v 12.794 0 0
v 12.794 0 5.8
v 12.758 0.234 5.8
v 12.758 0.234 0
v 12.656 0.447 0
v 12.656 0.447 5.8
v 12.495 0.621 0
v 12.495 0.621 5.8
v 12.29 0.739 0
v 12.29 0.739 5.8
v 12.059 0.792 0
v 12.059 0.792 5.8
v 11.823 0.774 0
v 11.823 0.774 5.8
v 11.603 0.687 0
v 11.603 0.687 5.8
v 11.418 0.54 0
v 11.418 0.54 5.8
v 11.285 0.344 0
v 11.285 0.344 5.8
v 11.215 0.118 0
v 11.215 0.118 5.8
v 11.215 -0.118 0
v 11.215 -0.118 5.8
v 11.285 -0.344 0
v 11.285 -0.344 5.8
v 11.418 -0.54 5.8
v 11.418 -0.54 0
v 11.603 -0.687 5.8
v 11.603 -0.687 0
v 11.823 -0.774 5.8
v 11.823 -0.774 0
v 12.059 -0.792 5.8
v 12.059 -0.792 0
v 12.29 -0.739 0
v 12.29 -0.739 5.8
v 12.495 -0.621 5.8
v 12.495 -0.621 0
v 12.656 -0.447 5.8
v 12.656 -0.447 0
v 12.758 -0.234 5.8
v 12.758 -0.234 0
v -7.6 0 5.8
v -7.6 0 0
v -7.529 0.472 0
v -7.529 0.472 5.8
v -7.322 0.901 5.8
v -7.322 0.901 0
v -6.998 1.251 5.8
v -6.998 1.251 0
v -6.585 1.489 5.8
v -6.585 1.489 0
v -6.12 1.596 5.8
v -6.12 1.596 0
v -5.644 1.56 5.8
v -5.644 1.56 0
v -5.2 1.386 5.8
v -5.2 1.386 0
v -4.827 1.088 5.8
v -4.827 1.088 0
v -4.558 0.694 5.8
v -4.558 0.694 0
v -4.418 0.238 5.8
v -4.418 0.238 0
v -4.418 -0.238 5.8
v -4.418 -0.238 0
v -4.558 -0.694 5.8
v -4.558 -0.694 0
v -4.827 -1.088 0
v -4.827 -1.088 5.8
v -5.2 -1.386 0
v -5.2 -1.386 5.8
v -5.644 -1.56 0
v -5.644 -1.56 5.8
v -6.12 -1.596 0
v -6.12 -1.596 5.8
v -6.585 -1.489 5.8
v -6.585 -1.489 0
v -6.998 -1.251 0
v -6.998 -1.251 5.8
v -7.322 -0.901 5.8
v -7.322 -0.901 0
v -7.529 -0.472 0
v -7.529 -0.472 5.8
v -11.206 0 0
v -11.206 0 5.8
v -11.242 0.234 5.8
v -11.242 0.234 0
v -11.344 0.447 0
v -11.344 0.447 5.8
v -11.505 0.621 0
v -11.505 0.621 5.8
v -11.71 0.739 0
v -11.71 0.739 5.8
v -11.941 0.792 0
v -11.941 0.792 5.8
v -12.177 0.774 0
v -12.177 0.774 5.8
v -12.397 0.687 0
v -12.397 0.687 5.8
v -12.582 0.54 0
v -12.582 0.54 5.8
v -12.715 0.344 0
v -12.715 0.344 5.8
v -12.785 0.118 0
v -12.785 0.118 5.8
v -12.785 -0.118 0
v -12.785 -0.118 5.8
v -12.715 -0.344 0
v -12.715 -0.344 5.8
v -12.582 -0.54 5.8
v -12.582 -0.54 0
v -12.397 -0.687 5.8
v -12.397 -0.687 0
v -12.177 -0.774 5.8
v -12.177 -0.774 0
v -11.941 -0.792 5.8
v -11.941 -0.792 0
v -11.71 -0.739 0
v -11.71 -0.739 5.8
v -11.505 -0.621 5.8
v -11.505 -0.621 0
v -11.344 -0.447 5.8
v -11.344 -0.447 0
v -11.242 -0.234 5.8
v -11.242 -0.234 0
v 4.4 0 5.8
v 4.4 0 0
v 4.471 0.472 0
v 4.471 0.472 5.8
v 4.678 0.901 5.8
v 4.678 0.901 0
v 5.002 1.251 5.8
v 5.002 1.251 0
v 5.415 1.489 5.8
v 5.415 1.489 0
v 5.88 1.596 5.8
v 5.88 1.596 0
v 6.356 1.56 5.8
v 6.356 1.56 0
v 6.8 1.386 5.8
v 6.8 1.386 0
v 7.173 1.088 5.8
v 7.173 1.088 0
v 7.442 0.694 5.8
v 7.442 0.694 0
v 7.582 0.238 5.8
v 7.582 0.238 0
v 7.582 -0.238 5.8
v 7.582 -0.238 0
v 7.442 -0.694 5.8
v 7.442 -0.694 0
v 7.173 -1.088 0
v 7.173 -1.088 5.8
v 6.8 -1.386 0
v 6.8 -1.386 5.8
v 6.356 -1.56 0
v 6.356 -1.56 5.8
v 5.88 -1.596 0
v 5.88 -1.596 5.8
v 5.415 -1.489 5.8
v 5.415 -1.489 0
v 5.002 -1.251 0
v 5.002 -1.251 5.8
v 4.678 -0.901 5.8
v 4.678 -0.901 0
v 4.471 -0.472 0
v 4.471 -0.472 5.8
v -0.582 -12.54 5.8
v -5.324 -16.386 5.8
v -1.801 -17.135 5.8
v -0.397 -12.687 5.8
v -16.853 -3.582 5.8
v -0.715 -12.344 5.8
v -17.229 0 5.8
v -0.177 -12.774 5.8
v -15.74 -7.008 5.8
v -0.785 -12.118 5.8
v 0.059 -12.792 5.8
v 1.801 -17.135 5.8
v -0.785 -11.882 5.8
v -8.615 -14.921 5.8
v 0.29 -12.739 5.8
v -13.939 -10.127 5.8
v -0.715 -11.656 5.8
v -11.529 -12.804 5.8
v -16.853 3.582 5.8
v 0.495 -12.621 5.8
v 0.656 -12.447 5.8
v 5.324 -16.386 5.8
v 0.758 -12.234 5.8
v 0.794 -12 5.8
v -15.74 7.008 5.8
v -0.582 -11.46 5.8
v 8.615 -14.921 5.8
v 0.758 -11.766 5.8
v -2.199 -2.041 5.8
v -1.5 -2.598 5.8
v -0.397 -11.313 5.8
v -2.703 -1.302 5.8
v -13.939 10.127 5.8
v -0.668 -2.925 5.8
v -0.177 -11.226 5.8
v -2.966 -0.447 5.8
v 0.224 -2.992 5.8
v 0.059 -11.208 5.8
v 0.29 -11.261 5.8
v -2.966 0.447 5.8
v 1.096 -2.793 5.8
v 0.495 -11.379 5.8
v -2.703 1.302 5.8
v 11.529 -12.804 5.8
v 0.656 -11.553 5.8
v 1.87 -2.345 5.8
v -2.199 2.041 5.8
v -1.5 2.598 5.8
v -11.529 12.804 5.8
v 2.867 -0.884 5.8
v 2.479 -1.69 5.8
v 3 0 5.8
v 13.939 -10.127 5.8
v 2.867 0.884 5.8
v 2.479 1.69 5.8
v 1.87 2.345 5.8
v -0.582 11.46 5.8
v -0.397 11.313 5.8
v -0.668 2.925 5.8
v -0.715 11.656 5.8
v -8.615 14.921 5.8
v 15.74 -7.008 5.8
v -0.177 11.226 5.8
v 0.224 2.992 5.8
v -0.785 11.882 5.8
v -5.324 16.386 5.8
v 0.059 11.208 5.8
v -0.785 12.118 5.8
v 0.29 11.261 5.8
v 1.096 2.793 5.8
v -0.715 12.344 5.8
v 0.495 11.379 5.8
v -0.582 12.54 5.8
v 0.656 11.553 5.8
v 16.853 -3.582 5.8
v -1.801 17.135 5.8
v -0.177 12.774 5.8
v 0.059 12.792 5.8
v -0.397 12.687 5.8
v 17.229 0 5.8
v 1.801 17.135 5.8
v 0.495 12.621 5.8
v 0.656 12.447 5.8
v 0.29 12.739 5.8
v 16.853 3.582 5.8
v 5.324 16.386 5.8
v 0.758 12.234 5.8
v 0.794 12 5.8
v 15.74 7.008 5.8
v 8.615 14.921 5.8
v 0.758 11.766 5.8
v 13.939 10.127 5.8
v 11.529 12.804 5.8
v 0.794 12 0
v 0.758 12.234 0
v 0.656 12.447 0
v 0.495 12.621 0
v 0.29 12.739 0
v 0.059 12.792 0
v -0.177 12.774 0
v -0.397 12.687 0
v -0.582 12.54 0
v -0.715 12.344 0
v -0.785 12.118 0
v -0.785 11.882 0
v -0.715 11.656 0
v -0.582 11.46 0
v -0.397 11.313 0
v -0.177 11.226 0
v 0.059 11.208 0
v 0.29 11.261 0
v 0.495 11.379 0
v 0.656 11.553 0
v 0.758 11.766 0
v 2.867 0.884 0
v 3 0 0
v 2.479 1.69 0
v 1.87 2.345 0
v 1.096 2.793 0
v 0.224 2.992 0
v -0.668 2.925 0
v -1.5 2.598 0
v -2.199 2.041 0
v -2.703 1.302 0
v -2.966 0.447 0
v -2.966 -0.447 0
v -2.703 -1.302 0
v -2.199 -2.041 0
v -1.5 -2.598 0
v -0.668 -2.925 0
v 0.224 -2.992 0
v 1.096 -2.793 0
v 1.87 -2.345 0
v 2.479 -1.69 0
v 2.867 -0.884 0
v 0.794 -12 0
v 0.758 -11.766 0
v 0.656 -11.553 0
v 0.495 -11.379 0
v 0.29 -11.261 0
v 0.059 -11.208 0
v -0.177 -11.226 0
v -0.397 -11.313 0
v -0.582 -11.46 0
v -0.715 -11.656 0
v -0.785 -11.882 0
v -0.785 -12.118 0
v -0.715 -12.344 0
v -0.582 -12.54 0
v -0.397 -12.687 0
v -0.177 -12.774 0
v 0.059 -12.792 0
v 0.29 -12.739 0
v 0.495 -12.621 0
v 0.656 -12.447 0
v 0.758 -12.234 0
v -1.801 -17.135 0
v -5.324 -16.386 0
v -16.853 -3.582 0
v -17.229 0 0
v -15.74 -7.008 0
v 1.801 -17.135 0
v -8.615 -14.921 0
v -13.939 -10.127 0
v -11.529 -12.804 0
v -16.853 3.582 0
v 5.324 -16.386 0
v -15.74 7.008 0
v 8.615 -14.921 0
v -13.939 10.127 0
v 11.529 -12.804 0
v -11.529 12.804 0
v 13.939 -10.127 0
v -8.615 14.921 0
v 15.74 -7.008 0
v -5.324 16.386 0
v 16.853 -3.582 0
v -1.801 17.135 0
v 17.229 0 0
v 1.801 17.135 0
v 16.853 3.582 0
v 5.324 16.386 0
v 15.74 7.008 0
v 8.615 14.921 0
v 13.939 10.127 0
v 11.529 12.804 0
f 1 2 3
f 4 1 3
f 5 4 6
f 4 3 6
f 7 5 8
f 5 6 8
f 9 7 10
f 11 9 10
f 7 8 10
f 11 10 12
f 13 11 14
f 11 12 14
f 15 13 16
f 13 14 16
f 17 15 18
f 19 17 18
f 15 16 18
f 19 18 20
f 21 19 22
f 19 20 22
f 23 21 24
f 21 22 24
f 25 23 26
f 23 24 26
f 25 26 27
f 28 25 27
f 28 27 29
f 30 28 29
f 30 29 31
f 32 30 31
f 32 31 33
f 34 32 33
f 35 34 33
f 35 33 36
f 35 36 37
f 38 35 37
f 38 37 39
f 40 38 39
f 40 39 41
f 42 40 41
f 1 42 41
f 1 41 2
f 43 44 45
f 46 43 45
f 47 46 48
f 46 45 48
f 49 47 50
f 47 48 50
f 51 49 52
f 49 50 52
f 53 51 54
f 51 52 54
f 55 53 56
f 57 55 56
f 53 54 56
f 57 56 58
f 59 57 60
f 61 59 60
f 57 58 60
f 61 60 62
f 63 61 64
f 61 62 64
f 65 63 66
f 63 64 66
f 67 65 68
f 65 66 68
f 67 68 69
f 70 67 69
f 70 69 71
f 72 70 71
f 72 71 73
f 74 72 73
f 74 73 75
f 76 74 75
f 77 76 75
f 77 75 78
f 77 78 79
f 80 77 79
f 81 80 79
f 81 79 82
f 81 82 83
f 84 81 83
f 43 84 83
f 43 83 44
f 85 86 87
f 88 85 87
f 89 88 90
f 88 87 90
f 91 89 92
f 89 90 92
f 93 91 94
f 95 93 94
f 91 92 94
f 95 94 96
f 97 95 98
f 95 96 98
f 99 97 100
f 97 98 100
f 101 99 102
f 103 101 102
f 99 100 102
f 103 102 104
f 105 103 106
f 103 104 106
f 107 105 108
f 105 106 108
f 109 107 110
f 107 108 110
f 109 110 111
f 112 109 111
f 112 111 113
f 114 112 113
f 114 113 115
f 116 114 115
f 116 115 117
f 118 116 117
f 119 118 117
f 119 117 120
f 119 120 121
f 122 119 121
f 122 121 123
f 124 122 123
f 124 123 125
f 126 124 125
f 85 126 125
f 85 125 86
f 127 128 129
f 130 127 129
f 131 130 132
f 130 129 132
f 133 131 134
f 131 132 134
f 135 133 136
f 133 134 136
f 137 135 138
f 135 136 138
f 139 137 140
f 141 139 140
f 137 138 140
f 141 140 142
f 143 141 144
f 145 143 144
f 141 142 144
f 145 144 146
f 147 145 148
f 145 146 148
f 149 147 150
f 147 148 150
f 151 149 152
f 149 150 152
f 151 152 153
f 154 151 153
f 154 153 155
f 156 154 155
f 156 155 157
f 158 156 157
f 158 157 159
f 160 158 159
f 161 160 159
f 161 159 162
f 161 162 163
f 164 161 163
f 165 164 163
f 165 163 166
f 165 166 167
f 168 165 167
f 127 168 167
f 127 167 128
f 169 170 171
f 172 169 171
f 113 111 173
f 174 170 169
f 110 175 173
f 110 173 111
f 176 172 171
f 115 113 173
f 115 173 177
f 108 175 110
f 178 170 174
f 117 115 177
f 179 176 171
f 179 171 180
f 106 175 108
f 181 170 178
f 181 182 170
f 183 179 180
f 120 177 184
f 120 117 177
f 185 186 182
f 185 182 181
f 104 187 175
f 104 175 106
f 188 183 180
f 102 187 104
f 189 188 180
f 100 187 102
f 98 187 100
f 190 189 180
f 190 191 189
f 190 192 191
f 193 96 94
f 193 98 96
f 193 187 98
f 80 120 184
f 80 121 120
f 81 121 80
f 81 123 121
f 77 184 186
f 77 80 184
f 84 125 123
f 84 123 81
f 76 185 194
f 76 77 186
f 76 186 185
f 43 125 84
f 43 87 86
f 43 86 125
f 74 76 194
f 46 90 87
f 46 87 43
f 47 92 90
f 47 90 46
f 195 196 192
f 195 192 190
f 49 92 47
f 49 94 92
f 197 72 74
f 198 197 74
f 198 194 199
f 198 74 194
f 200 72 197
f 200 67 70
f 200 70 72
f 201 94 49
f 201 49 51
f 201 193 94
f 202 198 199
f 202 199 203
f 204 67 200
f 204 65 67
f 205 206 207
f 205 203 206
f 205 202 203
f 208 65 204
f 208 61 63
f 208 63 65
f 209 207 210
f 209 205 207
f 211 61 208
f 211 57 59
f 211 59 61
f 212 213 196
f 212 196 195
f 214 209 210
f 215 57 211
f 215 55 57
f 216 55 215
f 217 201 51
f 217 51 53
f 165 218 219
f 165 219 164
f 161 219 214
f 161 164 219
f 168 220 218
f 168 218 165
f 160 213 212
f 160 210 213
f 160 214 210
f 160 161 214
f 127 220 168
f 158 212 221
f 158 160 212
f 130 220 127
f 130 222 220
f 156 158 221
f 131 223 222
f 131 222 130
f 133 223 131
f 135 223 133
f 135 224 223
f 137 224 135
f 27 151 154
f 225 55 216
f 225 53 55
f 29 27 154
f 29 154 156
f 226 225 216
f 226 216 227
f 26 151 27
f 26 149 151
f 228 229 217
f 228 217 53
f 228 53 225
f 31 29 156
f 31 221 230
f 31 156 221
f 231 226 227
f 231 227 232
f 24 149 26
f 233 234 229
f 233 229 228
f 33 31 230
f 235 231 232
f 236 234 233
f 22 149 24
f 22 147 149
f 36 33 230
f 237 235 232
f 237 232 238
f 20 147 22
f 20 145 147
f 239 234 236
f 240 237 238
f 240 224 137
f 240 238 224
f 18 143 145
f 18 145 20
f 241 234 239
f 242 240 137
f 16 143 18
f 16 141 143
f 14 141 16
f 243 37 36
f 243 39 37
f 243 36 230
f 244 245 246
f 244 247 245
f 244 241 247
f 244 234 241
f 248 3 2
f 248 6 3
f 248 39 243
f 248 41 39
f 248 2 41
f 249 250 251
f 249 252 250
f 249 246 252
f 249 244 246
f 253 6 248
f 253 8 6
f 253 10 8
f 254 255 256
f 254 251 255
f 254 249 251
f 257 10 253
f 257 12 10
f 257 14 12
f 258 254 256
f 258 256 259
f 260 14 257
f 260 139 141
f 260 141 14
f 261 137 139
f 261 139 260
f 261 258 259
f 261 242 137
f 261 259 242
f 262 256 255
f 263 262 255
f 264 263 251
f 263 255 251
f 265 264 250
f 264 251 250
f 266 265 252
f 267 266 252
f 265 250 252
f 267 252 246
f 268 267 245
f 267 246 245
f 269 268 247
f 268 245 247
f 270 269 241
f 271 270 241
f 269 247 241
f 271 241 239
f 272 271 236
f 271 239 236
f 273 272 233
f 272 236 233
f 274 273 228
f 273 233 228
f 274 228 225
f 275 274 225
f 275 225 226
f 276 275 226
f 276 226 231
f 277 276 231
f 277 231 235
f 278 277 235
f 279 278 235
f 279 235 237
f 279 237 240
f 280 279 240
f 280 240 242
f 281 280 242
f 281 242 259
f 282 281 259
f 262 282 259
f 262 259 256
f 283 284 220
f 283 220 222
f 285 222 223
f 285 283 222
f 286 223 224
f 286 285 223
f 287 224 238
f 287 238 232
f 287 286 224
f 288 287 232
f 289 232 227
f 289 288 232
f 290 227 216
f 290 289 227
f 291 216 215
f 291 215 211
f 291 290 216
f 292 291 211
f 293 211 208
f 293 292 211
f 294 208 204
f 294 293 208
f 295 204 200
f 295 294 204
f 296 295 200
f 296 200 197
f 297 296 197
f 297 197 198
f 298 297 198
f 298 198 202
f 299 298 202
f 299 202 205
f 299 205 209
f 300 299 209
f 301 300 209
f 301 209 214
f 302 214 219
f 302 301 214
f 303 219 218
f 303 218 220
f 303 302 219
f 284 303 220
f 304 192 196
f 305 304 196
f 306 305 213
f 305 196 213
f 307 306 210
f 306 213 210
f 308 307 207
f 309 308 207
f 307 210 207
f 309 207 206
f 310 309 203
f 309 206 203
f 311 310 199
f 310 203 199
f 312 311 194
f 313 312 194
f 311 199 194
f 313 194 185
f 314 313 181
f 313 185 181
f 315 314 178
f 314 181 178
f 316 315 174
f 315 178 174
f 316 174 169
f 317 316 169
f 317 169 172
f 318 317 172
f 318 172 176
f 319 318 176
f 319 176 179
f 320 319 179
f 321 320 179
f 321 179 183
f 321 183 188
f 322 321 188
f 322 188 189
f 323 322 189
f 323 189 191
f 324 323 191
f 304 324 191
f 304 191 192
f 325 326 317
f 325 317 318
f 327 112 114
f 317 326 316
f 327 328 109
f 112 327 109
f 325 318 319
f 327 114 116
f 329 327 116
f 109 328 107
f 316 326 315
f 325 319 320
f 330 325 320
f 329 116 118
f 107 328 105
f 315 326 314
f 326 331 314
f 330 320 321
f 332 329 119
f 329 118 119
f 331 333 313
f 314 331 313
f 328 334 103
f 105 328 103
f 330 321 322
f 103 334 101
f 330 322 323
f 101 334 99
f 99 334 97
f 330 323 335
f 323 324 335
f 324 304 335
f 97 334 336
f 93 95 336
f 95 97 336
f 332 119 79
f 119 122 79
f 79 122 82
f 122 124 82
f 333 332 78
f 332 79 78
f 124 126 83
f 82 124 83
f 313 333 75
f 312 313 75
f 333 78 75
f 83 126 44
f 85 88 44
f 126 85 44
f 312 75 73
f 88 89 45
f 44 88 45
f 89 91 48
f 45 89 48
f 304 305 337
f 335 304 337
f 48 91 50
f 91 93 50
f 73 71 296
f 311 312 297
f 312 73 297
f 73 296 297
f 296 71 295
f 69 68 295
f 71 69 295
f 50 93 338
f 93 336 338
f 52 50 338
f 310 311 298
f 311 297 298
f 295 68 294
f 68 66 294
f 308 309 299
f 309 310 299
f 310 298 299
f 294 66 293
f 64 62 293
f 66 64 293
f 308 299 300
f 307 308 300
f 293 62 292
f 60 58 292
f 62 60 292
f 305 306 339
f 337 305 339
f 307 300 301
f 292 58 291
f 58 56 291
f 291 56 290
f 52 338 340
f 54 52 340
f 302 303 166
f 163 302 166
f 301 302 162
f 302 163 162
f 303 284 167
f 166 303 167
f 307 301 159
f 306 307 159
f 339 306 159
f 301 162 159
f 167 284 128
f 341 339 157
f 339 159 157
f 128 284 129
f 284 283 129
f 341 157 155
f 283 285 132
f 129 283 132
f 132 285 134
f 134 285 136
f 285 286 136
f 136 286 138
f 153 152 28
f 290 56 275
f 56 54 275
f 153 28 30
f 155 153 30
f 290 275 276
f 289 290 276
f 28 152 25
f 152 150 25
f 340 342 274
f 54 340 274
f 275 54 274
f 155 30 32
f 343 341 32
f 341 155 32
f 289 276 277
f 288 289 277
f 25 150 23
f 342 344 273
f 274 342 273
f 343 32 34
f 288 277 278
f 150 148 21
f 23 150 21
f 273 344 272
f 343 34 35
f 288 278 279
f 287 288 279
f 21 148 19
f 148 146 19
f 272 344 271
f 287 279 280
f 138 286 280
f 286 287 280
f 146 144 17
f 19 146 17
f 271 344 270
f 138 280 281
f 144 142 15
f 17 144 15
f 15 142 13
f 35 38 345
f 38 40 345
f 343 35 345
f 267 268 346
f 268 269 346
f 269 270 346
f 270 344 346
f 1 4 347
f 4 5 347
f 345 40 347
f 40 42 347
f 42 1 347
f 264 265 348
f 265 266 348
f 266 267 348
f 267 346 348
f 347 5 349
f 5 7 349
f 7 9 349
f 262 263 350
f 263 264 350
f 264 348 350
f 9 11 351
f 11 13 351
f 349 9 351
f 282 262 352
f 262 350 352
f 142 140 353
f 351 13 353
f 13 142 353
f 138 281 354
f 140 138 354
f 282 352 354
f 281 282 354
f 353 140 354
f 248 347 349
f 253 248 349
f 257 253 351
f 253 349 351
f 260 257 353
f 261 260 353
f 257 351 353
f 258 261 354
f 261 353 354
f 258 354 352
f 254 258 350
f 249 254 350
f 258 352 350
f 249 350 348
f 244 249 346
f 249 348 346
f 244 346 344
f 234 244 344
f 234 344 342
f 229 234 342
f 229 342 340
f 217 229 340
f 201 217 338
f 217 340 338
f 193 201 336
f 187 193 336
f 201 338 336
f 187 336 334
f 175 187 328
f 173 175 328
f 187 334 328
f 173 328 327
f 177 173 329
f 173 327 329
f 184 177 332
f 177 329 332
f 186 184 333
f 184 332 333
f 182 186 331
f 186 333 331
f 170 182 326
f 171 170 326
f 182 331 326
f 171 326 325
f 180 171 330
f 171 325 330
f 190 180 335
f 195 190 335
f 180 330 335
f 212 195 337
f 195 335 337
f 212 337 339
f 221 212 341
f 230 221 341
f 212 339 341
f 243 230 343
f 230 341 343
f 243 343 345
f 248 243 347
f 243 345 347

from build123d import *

# Parameters (mm, degrees)
SKETCH1_R                = 17.229166667
SKETCH1_R_2              = 3
BOSS_EXTRUDE1_DEPTH      = 5.8
SKETCH2_R                = 0.79375
CUT_EXTRUDE1_DEPTH       = 26.046524071
M3_CLEARANCE_HOLE1_D     = 3.2
M3_CLEARANCE_HOLE1_DEPTH = 12.7
M3_CLEARANCE_HOLE1_TIP   = 0.96137699


with BuildPart() as part:
    # Sketch1 → Boss-Extrude1 (new body)
    with BuildSketch(Plane.XY):
        Circle(SKETCH1_R)
        Circle(SKETCH1_R_2, mode=Mode.SUBTRACT)
    extrude(amount=BOSS_EXTRUDE1_DEPTH)

    # Sketch2 → Cut-Extrude1 (cut, through all)
    with BuildSketch(Plane.XY.offset(5.8)):
        with Locations((0, 12)):
            Circle(SKETCH2_R)
        with Locations((12, 0)):
            Circle(SKETCH2_R)
        with Locations((0, -12)):
            Circle(SKETCH2_R)
        with Locations((-12, 0)):
            Circle(SKETCH2_R)
    extrude(amount=-CUT_EXTRUDE1_DEPTH, mode=Mode.SUBTRACT)

    # M3 Clearance Hole1
    with Locations(Plane.XY.offset(5.8)):
        with Locations((-6, 0), (6, 0)):
            Hole(M3_CLEARANCE_HOLE1_D / 2, depth=M3_CLEARANCE_HOLE1_DEPTH)
            with Locations((0, 0, -(M3_CLEARANCE_HOLE1_DEPTH + M3_CLEARANCE_HOLE1_TIP / 2))):  # 118° drill point
                Cone(0, M3_CLEARANCE_HOLE1_D / 2, M3_CLEARANCE_HOLE1_TIP, mode=Mode.SUBTRACT)


solid = part.part
